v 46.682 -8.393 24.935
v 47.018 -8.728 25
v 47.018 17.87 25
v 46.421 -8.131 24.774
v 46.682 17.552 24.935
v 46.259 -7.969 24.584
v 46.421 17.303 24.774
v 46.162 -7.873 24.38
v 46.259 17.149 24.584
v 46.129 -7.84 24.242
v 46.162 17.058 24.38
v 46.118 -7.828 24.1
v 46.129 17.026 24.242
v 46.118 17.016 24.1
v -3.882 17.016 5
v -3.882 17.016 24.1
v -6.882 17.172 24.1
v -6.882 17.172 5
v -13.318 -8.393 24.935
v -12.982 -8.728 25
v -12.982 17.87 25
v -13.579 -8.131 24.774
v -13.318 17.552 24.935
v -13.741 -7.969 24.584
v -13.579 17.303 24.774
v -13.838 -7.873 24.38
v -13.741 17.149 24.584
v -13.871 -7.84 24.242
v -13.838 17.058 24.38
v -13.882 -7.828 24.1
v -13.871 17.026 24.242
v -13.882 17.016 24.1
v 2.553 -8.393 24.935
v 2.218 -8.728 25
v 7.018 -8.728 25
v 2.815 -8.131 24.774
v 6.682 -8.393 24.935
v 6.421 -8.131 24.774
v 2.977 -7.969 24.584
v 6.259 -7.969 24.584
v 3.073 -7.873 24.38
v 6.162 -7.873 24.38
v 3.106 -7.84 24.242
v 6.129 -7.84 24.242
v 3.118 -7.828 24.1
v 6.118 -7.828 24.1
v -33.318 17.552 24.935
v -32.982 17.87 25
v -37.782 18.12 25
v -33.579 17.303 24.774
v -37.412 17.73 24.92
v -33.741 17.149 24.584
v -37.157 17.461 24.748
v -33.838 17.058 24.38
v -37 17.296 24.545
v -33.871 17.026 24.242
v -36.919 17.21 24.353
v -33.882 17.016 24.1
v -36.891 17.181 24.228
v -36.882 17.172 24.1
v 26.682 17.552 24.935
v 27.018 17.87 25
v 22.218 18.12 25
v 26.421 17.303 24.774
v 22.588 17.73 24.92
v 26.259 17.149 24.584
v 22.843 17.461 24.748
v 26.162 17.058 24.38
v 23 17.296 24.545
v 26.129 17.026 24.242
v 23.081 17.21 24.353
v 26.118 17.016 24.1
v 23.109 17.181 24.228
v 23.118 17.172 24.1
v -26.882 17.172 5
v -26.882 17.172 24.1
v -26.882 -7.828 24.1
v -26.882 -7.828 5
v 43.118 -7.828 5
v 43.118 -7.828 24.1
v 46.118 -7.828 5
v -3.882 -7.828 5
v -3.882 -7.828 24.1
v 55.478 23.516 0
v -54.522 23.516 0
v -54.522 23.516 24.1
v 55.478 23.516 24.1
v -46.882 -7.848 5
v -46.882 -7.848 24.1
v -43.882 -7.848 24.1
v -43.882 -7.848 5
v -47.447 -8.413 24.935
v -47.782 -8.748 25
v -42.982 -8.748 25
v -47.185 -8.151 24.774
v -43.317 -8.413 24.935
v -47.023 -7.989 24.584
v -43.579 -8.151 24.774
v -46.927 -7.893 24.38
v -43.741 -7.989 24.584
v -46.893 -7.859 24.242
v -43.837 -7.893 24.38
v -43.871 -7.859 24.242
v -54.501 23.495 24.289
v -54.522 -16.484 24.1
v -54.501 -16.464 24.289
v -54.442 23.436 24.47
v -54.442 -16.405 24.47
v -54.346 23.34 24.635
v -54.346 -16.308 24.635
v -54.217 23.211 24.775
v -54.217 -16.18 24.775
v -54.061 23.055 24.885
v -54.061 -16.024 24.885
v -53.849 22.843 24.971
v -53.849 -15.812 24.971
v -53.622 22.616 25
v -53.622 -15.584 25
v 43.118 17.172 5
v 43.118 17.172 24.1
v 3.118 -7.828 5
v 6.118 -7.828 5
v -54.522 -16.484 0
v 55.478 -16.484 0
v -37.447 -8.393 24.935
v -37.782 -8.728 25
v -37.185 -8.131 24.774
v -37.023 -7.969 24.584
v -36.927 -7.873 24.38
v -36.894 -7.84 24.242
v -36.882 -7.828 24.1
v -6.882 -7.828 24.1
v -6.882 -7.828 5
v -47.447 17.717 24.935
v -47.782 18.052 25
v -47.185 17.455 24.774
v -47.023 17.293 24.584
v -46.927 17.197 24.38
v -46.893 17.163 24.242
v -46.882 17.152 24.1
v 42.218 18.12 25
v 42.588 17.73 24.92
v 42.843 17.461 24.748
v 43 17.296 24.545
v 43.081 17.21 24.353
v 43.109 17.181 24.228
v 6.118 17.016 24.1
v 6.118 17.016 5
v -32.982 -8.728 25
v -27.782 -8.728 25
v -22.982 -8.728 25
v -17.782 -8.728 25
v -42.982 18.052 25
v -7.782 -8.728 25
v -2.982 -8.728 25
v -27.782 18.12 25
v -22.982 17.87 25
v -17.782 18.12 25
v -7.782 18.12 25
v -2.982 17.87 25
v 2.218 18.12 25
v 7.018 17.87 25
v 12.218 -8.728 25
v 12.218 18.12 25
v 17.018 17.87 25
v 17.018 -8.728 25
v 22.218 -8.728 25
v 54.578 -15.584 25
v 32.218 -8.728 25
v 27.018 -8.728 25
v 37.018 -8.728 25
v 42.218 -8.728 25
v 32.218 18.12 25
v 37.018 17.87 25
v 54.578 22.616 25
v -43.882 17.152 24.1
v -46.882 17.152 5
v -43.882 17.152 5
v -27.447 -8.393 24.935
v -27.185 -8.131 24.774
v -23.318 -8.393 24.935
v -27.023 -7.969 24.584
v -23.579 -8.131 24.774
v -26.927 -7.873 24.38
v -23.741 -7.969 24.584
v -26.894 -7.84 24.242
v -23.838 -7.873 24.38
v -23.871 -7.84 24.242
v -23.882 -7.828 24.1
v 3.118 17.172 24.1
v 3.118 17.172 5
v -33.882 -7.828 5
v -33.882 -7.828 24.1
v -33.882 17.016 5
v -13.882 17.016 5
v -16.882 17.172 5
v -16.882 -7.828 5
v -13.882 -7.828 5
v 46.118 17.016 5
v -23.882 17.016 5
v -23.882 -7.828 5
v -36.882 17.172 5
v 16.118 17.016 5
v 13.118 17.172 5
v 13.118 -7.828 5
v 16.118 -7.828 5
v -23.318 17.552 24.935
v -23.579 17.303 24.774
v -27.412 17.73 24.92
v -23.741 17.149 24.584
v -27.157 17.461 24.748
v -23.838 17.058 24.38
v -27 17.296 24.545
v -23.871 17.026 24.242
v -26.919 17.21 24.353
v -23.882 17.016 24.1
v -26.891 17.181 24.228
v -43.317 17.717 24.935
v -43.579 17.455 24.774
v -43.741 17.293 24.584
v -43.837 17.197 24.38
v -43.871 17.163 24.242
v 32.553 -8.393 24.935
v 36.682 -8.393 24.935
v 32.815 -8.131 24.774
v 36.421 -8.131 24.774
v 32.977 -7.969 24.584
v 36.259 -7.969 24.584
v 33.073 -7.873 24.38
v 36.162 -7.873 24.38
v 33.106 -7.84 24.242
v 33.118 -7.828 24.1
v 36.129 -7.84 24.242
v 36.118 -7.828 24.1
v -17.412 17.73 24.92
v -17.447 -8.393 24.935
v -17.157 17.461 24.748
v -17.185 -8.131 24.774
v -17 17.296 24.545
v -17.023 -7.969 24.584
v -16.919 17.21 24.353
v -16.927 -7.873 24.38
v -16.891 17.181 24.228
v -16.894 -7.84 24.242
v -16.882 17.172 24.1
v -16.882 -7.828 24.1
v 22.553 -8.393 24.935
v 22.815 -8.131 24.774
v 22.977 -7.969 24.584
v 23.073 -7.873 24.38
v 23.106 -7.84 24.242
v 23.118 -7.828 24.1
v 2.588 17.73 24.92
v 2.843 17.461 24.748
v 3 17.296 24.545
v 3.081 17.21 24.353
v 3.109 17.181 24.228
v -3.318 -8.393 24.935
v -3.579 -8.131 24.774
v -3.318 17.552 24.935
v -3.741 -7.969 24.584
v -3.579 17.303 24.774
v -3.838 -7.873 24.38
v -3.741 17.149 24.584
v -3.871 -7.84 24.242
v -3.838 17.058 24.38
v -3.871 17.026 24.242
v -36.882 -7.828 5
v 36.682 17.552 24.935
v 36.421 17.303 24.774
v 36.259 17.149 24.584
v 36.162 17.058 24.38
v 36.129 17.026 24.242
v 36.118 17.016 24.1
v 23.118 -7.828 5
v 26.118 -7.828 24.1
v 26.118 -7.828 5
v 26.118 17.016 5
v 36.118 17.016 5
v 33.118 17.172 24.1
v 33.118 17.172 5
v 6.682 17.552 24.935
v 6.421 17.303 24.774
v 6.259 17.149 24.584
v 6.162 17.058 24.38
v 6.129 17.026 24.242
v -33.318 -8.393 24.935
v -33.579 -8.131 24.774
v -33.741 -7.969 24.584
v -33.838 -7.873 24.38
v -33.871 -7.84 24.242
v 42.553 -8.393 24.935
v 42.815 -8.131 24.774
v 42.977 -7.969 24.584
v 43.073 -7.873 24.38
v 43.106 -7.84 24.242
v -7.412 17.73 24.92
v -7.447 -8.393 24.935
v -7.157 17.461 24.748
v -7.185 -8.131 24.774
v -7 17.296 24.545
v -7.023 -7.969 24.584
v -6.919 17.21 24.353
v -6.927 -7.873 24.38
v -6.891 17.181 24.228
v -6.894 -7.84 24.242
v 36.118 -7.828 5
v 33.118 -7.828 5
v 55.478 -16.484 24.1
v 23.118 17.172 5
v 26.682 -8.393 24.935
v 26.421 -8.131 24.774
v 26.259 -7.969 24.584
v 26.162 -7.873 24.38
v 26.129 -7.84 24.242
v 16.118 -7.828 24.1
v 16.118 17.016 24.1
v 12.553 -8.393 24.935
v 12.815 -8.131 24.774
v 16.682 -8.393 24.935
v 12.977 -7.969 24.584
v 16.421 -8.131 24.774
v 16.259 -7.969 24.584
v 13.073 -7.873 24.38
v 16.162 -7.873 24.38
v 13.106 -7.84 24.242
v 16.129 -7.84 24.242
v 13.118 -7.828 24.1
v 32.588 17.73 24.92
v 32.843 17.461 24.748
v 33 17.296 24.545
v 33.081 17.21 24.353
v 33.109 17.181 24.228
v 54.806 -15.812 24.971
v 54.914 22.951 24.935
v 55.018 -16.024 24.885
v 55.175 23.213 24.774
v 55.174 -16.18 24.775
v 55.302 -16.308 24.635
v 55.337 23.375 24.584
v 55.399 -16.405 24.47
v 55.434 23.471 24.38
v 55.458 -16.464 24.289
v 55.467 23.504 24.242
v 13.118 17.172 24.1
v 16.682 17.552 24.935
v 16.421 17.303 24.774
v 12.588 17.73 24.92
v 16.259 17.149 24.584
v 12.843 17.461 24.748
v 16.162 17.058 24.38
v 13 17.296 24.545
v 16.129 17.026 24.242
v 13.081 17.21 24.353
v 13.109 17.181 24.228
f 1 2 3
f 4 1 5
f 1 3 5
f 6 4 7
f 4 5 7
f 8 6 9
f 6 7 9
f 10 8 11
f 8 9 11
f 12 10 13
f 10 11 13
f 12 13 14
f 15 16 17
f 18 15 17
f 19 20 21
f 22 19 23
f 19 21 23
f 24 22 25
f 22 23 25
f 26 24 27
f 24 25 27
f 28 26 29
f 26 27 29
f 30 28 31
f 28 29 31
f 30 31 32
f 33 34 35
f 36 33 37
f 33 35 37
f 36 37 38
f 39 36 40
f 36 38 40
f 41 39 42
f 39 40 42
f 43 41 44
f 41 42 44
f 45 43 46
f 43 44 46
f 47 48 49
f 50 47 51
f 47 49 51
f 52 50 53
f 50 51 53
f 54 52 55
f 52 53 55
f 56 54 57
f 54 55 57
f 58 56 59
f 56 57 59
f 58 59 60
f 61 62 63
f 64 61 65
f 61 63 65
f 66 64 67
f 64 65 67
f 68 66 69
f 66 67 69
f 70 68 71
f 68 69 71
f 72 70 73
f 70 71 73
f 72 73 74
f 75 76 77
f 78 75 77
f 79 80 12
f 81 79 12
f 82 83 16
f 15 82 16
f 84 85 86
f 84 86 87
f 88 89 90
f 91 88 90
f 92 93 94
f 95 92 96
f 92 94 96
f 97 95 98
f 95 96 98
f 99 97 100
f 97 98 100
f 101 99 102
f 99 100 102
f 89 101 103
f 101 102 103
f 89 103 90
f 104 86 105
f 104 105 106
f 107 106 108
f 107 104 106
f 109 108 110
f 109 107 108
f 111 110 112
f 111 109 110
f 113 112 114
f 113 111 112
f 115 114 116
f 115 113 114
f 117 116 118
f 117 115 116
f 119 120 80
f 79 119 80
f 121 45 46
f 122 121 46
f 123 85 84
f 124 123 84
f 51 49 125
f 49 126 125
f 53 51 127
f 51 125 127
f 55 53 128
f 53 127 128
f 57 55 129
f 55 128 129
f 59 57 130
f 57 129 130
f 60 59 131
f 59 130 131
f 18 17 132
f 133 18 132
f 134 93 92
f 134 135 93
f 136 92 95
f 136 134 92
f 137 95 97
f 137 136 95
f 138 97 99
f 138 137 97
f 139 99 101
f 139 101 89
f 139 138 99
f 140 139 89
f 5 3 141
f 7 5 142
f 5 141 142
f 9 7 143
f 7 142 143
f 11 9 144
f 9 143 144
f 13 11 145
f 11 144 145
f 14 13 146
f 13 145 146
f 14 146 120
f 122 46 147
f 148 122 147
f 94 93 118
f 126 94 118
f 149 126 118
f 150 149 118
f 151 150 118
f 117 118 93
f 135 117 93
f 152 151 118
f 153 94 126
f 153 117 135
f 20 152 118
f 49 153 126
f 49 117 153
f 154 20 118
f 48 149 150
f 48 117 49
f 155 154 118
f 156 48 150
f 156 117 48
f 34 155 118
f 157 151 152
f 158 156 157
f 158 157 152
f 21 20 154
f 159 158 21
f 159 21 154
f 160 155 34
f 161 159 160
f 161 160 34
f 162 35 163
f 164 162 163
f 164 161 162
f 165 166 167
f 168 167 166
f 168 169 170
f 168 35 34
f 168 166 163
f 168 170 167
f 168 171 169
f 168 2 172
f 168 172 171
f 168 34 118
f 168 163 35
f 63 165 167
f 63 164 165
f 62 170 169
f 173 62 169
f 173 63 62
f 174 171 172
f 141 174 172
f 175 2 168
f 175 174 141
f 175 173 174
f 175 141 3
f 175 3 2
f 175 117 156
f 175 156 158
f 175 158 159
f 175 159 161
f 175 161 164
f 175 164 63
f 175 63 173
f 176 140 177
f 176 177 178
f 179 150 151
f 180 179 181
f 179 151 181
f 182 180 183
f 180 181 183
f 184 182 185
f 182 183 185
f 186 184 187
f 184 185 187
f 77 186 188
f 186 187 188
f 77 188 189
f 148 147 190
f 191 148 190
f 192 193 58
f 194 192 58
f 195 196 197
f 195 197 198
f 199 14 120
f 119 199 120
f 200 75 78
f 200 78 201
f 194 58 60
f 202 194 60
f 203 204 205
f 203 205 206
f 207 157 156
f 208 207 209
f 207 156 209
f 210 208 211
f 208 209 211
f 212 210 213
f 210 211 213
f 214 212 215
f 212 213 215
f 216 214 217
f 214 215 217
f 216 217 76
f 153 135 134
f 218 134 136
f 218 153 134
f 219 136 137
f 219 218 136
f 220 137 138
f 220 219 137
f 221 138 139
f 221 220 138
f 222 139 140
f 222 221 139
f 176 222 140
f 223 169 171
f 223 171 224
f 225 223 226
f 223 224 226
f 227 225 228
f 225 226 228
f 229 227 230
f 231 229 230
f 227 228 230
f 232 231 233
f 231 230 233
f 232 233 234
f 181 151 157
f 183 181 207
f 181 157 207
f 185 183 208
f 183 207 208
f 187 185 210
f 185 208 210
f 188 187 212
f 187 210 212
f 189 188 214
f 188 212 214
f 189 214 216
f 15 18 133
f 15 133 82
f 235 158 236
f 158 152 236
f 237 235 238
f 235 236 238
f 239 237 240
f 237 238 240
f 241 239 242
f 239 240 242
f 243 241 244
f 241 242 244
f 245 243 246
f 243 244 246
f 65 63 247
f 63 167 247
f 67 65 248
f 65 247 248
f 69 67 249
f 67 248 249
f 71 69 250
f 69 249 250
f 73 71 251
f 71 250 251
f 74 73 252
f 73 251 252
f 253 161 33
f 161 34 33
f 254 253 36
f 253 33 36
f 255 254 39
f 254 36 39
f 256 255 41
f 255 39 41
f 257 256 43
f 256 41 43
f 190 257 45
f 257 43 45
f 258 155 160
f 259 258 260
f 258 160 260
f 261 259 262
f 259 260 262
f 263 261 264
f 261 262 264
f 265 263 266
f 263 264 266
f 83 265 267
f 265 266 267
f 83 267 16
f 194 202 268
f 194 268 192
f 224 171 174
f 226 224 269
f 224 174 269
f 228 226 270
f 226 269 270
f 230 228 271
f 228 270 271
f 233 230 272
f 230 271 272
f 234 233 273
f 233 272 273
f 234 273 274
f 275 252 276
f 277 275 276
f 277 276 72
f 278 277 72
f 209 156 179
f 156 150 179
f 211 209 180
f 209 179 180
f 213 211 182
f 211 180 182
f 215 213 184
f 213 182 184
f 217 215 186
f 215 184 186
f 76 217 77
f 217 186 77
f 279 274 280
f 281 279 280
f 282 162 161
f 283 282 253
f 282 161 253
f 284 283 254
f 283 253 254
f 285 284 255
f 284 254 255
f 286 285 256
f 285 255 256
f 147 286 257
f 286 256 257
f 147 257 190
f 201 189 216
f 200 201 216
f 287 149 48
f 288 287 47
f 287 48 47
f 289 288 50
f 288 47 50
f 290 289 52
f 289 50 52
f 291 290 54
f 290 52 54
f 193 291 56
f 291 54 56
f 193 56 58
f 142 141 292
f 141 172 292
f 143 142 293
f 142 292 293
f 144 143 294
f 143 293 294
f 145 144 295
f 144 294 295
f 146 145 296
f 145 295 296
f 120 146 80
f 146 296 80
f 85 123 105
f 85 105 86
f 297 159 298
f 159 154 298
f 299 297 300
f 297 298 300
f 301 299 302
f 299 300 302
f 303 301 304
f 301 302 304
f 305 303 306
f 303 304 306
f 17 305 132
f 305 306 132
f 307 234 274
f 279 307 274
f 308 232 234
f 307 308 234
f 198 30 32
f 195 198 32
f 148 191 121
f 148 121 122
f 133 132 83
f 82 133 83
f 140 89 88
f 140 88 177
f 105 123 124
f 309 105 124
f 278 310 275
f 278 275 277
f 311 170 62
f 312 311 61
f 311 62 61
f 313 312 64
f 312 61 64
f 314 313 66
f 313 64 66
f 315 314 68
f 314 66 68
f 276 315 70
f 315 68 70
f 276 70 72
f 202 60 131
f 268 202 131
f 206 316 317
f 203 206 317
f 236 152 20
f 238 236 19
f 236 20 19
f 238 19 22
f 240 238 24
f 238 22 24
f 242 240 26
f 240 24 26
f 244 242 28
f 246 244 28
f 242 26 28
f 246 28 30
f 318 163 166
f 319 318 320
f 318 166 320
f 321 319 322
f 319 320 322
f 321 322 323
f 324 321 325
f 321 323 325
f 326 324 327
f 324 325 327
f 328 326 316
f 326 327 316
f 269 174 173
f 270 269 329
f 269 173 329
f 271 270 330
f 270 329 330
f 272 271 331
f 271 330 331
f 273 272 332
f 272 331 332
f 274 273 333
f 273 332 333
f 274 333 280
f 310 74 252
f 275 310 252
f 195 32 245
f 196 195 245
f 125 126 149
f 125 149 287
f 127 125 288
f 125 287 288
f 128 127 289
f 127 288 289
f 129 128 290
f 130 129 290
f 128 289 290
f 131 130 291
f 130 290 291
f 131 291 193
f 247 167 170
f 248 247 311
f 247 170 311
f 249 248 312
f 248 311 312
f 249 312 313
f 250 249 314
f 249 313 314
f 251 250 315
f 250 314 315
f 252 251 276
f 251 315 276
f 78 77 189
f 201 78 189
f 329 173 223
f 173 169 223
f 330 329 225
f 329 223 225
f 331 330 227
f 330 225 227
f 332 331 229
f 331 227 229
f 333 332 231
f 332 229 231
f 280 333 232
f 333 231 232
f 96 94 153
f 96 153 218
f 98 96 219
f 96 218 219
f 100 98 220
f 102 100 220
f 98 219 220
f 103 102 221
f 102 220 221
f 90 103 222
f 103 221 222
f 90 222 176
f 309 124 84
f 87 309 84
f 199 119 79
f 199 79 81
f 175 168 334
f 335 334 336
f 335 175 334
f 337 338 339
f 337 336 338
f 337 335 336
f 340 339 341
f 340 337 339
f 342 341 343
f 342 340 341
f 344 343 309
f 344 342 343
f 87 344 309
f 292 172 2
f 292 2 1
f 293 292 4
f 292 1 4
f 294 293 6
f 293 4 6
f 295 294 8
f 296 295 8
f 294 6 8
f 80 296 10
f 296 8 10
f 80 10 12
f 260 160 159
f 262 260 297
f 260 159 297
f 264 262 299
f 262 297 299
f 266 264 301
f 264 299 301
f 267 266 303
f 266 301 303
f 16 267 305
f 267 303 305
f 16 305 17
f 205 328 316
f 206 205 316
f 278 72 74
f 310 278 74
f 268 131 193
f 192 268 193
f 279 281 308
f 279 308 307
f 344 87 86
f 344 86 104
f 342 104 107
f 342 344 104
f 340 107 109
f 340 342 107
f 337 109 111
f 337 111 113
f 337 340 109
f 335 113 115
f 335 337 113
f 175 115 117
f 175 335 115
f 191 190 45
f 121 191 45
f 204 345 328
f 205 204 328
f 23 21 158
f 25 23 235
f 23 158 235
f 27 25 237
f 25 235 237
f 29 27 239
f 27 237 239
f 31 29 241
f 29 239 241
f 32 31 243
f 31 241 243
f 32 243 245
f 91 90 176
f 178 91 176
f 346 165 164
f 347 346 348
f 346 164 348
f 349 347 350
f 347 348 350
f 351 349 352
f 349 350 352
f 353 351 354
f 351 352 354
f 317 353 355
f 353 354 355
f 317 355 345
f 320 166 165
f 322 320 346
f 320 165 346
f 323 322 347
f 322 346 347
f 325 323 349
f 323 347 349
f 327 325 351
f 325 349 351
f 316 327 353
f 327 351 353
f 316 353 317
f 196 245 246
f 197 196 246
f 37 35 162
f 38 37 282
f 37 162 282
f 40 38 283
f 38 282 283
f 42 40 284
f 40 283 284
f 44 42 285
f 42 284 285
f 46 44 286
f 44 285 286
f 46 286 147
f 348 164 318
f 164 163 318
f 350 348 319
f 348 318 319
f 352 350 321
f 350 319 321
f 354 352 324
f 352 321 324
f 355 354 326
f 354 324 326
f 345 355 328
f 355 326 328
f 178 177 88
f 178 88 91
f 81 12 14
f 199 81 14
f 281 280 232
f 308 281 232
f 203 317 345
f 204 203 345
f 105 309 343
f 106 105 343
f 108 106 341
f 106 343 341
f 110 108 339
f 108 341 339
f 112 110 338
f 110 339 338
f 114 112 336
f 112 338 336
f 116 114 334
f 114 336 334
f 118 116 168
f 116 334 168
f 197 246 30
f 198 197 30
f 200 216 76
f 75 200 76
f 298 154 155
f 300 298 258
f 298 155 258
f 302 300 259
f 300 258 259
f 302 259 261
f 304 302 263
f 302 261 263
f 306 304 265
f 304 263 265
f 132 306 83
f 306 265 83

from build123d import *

# Parameters (mm, degrees)
F0_W     = 110
F0_H     = 40
F1_DEPTH = 25
F2_W     = 3
F2_H     = 25
F3_DEPTH = 20
F4_R     = 0.9


with BuildPart() as f1:
    # F0 (on Top) → F1 (new body)
    with BuildSketch(Plane.XY):
        with Locations((0.478346, 3.515624)):
            Rectangle(F0_W, F0_H)
    extrude(amount=F1_DEPTH)

    # F2 (on face) → F3 (cut)
    with BuildSketch(Plane.XY.offset(25)):
        with Locations((-45.382225, 4.651876)):
            Rectangle(F2_W, F2_H)
        Polygon((-36.882324, 17.171759), (-36.882324, -7.828241), (-33.882324, -7.828241), (-33.882324, 17.01556), align=None)
        Polygon((-26.882324, 17.171759), (-26.882324, -7.828241), (-23.882324, -7.828241), (-23.882324, 17.01556), align=None)
        Polygon((-16.882324, 17.171759), (-16.882324, -7.828241), (-13.882324, -7.828241), (-13.882324, 17.01556), align=None)
        Polygon((-6.882324, 17.171759), (-6.882324, -7.828241), (-3.882324, -7.828241), (-3.882324, 17.01556), align=None)
        Polygon((3.117676, 17.171759), (3.117676, -7.828241), (6.117676, -7.828241), (6.117676, 17.01556), align=None)
        Polygon((13.117676, 17.171759), (13.117676, -7.828241), (16.117676, -7.828241), (16.117676, 17.01556), align=None)
        Polygon((23.117676, 17.171759), (23.117676, -7.828241), (26.117676, -7.828241), (26.117676, 17.01556), align=None)
        Polygon((33.117676, 17.171759), (33.117676, -7.828241), (36.117676, -7.828241), (36.117676, 17.01556), align=None)
        Polygon((43.117676, 17.171759), (43.117676, -7.828241), (46.117676, -7.828241), (46.117676, 17.01556), align=None)
    extrude(amount=-F3_DEPTH, mode=Mode.SUBTRACT)

    # F4
    f4_edges = [f1.edges().sort_by_distance(p)[0] for p in [
        (0.478346, -16.484376, 25),
        (-54.521654, 3.515624, 25),
        (55.478346, 3.515624, 25),
        (0.478346, 23.515624, 25),
        (-46.882225, 4.651876, 25),
        (-45.382225, -7.848124, 25),
        (-43.882225, 4.651876, 25),
        (-45.382225, 17.151876, 25),
        (-36.882324, 4.671759, 25),
        (-35.382324, -7.828241, 25),
        (-33.882324, 4.593659, 25),
        (-35.382324, 17.093659, 25),
        (-26.882324, 4.671759, 25),
        (-25.382324, -7.828241, 25),
        (-23.882324, 4.593659, 25),
        (-25.382324, 17.093659, 25),
        (-16.882324, 4.671759, 25),
        (-15.382324, -7.828241, 25),
        (-13.882324, 4.593659, 25),
        (-15.382324, 17.093659, 25),
        (-6.882324, 4.671759, 25),
        (-5.382324, -7.828241, 25),
        (-3.882324, 4.593659, 25),
        (-5.382324, 17.093659, 25),
        (3.117676, 4.671759, 25),
        (4.617676, -7.828241, 25),
        (6.117676, 4.593659, 25),
        (4.617676, 17.093659, 25),
        (13.117676, 4.671759, 25),
        (14.617676, -7.828241, 25),
        (16.117676, 4.593659, 25),
        (14.617676, 17.093659, 25),
        (23.117676, 4.671759, 25),
        (24.617676, -7.828241, 25),
        (26.117676, 4.593659, 25),
        (24.617676, 17.093659, 25),
        (33.117676, 4.671759, 25),
        (34.617676, -7.828241, 25),
        (36.117676, 4.593659, 25),
        (34.617676, 17.093659, 25),
        (43.117676, 4.671759, 25),
        (44.617676, -7.828241, 25),
        (46.117676, 4.593659, 25),
        (44.617676, 17.093659, 25),
    ]]
    fillet(f4_edges, radius=F4_R)


solid = f1.part
